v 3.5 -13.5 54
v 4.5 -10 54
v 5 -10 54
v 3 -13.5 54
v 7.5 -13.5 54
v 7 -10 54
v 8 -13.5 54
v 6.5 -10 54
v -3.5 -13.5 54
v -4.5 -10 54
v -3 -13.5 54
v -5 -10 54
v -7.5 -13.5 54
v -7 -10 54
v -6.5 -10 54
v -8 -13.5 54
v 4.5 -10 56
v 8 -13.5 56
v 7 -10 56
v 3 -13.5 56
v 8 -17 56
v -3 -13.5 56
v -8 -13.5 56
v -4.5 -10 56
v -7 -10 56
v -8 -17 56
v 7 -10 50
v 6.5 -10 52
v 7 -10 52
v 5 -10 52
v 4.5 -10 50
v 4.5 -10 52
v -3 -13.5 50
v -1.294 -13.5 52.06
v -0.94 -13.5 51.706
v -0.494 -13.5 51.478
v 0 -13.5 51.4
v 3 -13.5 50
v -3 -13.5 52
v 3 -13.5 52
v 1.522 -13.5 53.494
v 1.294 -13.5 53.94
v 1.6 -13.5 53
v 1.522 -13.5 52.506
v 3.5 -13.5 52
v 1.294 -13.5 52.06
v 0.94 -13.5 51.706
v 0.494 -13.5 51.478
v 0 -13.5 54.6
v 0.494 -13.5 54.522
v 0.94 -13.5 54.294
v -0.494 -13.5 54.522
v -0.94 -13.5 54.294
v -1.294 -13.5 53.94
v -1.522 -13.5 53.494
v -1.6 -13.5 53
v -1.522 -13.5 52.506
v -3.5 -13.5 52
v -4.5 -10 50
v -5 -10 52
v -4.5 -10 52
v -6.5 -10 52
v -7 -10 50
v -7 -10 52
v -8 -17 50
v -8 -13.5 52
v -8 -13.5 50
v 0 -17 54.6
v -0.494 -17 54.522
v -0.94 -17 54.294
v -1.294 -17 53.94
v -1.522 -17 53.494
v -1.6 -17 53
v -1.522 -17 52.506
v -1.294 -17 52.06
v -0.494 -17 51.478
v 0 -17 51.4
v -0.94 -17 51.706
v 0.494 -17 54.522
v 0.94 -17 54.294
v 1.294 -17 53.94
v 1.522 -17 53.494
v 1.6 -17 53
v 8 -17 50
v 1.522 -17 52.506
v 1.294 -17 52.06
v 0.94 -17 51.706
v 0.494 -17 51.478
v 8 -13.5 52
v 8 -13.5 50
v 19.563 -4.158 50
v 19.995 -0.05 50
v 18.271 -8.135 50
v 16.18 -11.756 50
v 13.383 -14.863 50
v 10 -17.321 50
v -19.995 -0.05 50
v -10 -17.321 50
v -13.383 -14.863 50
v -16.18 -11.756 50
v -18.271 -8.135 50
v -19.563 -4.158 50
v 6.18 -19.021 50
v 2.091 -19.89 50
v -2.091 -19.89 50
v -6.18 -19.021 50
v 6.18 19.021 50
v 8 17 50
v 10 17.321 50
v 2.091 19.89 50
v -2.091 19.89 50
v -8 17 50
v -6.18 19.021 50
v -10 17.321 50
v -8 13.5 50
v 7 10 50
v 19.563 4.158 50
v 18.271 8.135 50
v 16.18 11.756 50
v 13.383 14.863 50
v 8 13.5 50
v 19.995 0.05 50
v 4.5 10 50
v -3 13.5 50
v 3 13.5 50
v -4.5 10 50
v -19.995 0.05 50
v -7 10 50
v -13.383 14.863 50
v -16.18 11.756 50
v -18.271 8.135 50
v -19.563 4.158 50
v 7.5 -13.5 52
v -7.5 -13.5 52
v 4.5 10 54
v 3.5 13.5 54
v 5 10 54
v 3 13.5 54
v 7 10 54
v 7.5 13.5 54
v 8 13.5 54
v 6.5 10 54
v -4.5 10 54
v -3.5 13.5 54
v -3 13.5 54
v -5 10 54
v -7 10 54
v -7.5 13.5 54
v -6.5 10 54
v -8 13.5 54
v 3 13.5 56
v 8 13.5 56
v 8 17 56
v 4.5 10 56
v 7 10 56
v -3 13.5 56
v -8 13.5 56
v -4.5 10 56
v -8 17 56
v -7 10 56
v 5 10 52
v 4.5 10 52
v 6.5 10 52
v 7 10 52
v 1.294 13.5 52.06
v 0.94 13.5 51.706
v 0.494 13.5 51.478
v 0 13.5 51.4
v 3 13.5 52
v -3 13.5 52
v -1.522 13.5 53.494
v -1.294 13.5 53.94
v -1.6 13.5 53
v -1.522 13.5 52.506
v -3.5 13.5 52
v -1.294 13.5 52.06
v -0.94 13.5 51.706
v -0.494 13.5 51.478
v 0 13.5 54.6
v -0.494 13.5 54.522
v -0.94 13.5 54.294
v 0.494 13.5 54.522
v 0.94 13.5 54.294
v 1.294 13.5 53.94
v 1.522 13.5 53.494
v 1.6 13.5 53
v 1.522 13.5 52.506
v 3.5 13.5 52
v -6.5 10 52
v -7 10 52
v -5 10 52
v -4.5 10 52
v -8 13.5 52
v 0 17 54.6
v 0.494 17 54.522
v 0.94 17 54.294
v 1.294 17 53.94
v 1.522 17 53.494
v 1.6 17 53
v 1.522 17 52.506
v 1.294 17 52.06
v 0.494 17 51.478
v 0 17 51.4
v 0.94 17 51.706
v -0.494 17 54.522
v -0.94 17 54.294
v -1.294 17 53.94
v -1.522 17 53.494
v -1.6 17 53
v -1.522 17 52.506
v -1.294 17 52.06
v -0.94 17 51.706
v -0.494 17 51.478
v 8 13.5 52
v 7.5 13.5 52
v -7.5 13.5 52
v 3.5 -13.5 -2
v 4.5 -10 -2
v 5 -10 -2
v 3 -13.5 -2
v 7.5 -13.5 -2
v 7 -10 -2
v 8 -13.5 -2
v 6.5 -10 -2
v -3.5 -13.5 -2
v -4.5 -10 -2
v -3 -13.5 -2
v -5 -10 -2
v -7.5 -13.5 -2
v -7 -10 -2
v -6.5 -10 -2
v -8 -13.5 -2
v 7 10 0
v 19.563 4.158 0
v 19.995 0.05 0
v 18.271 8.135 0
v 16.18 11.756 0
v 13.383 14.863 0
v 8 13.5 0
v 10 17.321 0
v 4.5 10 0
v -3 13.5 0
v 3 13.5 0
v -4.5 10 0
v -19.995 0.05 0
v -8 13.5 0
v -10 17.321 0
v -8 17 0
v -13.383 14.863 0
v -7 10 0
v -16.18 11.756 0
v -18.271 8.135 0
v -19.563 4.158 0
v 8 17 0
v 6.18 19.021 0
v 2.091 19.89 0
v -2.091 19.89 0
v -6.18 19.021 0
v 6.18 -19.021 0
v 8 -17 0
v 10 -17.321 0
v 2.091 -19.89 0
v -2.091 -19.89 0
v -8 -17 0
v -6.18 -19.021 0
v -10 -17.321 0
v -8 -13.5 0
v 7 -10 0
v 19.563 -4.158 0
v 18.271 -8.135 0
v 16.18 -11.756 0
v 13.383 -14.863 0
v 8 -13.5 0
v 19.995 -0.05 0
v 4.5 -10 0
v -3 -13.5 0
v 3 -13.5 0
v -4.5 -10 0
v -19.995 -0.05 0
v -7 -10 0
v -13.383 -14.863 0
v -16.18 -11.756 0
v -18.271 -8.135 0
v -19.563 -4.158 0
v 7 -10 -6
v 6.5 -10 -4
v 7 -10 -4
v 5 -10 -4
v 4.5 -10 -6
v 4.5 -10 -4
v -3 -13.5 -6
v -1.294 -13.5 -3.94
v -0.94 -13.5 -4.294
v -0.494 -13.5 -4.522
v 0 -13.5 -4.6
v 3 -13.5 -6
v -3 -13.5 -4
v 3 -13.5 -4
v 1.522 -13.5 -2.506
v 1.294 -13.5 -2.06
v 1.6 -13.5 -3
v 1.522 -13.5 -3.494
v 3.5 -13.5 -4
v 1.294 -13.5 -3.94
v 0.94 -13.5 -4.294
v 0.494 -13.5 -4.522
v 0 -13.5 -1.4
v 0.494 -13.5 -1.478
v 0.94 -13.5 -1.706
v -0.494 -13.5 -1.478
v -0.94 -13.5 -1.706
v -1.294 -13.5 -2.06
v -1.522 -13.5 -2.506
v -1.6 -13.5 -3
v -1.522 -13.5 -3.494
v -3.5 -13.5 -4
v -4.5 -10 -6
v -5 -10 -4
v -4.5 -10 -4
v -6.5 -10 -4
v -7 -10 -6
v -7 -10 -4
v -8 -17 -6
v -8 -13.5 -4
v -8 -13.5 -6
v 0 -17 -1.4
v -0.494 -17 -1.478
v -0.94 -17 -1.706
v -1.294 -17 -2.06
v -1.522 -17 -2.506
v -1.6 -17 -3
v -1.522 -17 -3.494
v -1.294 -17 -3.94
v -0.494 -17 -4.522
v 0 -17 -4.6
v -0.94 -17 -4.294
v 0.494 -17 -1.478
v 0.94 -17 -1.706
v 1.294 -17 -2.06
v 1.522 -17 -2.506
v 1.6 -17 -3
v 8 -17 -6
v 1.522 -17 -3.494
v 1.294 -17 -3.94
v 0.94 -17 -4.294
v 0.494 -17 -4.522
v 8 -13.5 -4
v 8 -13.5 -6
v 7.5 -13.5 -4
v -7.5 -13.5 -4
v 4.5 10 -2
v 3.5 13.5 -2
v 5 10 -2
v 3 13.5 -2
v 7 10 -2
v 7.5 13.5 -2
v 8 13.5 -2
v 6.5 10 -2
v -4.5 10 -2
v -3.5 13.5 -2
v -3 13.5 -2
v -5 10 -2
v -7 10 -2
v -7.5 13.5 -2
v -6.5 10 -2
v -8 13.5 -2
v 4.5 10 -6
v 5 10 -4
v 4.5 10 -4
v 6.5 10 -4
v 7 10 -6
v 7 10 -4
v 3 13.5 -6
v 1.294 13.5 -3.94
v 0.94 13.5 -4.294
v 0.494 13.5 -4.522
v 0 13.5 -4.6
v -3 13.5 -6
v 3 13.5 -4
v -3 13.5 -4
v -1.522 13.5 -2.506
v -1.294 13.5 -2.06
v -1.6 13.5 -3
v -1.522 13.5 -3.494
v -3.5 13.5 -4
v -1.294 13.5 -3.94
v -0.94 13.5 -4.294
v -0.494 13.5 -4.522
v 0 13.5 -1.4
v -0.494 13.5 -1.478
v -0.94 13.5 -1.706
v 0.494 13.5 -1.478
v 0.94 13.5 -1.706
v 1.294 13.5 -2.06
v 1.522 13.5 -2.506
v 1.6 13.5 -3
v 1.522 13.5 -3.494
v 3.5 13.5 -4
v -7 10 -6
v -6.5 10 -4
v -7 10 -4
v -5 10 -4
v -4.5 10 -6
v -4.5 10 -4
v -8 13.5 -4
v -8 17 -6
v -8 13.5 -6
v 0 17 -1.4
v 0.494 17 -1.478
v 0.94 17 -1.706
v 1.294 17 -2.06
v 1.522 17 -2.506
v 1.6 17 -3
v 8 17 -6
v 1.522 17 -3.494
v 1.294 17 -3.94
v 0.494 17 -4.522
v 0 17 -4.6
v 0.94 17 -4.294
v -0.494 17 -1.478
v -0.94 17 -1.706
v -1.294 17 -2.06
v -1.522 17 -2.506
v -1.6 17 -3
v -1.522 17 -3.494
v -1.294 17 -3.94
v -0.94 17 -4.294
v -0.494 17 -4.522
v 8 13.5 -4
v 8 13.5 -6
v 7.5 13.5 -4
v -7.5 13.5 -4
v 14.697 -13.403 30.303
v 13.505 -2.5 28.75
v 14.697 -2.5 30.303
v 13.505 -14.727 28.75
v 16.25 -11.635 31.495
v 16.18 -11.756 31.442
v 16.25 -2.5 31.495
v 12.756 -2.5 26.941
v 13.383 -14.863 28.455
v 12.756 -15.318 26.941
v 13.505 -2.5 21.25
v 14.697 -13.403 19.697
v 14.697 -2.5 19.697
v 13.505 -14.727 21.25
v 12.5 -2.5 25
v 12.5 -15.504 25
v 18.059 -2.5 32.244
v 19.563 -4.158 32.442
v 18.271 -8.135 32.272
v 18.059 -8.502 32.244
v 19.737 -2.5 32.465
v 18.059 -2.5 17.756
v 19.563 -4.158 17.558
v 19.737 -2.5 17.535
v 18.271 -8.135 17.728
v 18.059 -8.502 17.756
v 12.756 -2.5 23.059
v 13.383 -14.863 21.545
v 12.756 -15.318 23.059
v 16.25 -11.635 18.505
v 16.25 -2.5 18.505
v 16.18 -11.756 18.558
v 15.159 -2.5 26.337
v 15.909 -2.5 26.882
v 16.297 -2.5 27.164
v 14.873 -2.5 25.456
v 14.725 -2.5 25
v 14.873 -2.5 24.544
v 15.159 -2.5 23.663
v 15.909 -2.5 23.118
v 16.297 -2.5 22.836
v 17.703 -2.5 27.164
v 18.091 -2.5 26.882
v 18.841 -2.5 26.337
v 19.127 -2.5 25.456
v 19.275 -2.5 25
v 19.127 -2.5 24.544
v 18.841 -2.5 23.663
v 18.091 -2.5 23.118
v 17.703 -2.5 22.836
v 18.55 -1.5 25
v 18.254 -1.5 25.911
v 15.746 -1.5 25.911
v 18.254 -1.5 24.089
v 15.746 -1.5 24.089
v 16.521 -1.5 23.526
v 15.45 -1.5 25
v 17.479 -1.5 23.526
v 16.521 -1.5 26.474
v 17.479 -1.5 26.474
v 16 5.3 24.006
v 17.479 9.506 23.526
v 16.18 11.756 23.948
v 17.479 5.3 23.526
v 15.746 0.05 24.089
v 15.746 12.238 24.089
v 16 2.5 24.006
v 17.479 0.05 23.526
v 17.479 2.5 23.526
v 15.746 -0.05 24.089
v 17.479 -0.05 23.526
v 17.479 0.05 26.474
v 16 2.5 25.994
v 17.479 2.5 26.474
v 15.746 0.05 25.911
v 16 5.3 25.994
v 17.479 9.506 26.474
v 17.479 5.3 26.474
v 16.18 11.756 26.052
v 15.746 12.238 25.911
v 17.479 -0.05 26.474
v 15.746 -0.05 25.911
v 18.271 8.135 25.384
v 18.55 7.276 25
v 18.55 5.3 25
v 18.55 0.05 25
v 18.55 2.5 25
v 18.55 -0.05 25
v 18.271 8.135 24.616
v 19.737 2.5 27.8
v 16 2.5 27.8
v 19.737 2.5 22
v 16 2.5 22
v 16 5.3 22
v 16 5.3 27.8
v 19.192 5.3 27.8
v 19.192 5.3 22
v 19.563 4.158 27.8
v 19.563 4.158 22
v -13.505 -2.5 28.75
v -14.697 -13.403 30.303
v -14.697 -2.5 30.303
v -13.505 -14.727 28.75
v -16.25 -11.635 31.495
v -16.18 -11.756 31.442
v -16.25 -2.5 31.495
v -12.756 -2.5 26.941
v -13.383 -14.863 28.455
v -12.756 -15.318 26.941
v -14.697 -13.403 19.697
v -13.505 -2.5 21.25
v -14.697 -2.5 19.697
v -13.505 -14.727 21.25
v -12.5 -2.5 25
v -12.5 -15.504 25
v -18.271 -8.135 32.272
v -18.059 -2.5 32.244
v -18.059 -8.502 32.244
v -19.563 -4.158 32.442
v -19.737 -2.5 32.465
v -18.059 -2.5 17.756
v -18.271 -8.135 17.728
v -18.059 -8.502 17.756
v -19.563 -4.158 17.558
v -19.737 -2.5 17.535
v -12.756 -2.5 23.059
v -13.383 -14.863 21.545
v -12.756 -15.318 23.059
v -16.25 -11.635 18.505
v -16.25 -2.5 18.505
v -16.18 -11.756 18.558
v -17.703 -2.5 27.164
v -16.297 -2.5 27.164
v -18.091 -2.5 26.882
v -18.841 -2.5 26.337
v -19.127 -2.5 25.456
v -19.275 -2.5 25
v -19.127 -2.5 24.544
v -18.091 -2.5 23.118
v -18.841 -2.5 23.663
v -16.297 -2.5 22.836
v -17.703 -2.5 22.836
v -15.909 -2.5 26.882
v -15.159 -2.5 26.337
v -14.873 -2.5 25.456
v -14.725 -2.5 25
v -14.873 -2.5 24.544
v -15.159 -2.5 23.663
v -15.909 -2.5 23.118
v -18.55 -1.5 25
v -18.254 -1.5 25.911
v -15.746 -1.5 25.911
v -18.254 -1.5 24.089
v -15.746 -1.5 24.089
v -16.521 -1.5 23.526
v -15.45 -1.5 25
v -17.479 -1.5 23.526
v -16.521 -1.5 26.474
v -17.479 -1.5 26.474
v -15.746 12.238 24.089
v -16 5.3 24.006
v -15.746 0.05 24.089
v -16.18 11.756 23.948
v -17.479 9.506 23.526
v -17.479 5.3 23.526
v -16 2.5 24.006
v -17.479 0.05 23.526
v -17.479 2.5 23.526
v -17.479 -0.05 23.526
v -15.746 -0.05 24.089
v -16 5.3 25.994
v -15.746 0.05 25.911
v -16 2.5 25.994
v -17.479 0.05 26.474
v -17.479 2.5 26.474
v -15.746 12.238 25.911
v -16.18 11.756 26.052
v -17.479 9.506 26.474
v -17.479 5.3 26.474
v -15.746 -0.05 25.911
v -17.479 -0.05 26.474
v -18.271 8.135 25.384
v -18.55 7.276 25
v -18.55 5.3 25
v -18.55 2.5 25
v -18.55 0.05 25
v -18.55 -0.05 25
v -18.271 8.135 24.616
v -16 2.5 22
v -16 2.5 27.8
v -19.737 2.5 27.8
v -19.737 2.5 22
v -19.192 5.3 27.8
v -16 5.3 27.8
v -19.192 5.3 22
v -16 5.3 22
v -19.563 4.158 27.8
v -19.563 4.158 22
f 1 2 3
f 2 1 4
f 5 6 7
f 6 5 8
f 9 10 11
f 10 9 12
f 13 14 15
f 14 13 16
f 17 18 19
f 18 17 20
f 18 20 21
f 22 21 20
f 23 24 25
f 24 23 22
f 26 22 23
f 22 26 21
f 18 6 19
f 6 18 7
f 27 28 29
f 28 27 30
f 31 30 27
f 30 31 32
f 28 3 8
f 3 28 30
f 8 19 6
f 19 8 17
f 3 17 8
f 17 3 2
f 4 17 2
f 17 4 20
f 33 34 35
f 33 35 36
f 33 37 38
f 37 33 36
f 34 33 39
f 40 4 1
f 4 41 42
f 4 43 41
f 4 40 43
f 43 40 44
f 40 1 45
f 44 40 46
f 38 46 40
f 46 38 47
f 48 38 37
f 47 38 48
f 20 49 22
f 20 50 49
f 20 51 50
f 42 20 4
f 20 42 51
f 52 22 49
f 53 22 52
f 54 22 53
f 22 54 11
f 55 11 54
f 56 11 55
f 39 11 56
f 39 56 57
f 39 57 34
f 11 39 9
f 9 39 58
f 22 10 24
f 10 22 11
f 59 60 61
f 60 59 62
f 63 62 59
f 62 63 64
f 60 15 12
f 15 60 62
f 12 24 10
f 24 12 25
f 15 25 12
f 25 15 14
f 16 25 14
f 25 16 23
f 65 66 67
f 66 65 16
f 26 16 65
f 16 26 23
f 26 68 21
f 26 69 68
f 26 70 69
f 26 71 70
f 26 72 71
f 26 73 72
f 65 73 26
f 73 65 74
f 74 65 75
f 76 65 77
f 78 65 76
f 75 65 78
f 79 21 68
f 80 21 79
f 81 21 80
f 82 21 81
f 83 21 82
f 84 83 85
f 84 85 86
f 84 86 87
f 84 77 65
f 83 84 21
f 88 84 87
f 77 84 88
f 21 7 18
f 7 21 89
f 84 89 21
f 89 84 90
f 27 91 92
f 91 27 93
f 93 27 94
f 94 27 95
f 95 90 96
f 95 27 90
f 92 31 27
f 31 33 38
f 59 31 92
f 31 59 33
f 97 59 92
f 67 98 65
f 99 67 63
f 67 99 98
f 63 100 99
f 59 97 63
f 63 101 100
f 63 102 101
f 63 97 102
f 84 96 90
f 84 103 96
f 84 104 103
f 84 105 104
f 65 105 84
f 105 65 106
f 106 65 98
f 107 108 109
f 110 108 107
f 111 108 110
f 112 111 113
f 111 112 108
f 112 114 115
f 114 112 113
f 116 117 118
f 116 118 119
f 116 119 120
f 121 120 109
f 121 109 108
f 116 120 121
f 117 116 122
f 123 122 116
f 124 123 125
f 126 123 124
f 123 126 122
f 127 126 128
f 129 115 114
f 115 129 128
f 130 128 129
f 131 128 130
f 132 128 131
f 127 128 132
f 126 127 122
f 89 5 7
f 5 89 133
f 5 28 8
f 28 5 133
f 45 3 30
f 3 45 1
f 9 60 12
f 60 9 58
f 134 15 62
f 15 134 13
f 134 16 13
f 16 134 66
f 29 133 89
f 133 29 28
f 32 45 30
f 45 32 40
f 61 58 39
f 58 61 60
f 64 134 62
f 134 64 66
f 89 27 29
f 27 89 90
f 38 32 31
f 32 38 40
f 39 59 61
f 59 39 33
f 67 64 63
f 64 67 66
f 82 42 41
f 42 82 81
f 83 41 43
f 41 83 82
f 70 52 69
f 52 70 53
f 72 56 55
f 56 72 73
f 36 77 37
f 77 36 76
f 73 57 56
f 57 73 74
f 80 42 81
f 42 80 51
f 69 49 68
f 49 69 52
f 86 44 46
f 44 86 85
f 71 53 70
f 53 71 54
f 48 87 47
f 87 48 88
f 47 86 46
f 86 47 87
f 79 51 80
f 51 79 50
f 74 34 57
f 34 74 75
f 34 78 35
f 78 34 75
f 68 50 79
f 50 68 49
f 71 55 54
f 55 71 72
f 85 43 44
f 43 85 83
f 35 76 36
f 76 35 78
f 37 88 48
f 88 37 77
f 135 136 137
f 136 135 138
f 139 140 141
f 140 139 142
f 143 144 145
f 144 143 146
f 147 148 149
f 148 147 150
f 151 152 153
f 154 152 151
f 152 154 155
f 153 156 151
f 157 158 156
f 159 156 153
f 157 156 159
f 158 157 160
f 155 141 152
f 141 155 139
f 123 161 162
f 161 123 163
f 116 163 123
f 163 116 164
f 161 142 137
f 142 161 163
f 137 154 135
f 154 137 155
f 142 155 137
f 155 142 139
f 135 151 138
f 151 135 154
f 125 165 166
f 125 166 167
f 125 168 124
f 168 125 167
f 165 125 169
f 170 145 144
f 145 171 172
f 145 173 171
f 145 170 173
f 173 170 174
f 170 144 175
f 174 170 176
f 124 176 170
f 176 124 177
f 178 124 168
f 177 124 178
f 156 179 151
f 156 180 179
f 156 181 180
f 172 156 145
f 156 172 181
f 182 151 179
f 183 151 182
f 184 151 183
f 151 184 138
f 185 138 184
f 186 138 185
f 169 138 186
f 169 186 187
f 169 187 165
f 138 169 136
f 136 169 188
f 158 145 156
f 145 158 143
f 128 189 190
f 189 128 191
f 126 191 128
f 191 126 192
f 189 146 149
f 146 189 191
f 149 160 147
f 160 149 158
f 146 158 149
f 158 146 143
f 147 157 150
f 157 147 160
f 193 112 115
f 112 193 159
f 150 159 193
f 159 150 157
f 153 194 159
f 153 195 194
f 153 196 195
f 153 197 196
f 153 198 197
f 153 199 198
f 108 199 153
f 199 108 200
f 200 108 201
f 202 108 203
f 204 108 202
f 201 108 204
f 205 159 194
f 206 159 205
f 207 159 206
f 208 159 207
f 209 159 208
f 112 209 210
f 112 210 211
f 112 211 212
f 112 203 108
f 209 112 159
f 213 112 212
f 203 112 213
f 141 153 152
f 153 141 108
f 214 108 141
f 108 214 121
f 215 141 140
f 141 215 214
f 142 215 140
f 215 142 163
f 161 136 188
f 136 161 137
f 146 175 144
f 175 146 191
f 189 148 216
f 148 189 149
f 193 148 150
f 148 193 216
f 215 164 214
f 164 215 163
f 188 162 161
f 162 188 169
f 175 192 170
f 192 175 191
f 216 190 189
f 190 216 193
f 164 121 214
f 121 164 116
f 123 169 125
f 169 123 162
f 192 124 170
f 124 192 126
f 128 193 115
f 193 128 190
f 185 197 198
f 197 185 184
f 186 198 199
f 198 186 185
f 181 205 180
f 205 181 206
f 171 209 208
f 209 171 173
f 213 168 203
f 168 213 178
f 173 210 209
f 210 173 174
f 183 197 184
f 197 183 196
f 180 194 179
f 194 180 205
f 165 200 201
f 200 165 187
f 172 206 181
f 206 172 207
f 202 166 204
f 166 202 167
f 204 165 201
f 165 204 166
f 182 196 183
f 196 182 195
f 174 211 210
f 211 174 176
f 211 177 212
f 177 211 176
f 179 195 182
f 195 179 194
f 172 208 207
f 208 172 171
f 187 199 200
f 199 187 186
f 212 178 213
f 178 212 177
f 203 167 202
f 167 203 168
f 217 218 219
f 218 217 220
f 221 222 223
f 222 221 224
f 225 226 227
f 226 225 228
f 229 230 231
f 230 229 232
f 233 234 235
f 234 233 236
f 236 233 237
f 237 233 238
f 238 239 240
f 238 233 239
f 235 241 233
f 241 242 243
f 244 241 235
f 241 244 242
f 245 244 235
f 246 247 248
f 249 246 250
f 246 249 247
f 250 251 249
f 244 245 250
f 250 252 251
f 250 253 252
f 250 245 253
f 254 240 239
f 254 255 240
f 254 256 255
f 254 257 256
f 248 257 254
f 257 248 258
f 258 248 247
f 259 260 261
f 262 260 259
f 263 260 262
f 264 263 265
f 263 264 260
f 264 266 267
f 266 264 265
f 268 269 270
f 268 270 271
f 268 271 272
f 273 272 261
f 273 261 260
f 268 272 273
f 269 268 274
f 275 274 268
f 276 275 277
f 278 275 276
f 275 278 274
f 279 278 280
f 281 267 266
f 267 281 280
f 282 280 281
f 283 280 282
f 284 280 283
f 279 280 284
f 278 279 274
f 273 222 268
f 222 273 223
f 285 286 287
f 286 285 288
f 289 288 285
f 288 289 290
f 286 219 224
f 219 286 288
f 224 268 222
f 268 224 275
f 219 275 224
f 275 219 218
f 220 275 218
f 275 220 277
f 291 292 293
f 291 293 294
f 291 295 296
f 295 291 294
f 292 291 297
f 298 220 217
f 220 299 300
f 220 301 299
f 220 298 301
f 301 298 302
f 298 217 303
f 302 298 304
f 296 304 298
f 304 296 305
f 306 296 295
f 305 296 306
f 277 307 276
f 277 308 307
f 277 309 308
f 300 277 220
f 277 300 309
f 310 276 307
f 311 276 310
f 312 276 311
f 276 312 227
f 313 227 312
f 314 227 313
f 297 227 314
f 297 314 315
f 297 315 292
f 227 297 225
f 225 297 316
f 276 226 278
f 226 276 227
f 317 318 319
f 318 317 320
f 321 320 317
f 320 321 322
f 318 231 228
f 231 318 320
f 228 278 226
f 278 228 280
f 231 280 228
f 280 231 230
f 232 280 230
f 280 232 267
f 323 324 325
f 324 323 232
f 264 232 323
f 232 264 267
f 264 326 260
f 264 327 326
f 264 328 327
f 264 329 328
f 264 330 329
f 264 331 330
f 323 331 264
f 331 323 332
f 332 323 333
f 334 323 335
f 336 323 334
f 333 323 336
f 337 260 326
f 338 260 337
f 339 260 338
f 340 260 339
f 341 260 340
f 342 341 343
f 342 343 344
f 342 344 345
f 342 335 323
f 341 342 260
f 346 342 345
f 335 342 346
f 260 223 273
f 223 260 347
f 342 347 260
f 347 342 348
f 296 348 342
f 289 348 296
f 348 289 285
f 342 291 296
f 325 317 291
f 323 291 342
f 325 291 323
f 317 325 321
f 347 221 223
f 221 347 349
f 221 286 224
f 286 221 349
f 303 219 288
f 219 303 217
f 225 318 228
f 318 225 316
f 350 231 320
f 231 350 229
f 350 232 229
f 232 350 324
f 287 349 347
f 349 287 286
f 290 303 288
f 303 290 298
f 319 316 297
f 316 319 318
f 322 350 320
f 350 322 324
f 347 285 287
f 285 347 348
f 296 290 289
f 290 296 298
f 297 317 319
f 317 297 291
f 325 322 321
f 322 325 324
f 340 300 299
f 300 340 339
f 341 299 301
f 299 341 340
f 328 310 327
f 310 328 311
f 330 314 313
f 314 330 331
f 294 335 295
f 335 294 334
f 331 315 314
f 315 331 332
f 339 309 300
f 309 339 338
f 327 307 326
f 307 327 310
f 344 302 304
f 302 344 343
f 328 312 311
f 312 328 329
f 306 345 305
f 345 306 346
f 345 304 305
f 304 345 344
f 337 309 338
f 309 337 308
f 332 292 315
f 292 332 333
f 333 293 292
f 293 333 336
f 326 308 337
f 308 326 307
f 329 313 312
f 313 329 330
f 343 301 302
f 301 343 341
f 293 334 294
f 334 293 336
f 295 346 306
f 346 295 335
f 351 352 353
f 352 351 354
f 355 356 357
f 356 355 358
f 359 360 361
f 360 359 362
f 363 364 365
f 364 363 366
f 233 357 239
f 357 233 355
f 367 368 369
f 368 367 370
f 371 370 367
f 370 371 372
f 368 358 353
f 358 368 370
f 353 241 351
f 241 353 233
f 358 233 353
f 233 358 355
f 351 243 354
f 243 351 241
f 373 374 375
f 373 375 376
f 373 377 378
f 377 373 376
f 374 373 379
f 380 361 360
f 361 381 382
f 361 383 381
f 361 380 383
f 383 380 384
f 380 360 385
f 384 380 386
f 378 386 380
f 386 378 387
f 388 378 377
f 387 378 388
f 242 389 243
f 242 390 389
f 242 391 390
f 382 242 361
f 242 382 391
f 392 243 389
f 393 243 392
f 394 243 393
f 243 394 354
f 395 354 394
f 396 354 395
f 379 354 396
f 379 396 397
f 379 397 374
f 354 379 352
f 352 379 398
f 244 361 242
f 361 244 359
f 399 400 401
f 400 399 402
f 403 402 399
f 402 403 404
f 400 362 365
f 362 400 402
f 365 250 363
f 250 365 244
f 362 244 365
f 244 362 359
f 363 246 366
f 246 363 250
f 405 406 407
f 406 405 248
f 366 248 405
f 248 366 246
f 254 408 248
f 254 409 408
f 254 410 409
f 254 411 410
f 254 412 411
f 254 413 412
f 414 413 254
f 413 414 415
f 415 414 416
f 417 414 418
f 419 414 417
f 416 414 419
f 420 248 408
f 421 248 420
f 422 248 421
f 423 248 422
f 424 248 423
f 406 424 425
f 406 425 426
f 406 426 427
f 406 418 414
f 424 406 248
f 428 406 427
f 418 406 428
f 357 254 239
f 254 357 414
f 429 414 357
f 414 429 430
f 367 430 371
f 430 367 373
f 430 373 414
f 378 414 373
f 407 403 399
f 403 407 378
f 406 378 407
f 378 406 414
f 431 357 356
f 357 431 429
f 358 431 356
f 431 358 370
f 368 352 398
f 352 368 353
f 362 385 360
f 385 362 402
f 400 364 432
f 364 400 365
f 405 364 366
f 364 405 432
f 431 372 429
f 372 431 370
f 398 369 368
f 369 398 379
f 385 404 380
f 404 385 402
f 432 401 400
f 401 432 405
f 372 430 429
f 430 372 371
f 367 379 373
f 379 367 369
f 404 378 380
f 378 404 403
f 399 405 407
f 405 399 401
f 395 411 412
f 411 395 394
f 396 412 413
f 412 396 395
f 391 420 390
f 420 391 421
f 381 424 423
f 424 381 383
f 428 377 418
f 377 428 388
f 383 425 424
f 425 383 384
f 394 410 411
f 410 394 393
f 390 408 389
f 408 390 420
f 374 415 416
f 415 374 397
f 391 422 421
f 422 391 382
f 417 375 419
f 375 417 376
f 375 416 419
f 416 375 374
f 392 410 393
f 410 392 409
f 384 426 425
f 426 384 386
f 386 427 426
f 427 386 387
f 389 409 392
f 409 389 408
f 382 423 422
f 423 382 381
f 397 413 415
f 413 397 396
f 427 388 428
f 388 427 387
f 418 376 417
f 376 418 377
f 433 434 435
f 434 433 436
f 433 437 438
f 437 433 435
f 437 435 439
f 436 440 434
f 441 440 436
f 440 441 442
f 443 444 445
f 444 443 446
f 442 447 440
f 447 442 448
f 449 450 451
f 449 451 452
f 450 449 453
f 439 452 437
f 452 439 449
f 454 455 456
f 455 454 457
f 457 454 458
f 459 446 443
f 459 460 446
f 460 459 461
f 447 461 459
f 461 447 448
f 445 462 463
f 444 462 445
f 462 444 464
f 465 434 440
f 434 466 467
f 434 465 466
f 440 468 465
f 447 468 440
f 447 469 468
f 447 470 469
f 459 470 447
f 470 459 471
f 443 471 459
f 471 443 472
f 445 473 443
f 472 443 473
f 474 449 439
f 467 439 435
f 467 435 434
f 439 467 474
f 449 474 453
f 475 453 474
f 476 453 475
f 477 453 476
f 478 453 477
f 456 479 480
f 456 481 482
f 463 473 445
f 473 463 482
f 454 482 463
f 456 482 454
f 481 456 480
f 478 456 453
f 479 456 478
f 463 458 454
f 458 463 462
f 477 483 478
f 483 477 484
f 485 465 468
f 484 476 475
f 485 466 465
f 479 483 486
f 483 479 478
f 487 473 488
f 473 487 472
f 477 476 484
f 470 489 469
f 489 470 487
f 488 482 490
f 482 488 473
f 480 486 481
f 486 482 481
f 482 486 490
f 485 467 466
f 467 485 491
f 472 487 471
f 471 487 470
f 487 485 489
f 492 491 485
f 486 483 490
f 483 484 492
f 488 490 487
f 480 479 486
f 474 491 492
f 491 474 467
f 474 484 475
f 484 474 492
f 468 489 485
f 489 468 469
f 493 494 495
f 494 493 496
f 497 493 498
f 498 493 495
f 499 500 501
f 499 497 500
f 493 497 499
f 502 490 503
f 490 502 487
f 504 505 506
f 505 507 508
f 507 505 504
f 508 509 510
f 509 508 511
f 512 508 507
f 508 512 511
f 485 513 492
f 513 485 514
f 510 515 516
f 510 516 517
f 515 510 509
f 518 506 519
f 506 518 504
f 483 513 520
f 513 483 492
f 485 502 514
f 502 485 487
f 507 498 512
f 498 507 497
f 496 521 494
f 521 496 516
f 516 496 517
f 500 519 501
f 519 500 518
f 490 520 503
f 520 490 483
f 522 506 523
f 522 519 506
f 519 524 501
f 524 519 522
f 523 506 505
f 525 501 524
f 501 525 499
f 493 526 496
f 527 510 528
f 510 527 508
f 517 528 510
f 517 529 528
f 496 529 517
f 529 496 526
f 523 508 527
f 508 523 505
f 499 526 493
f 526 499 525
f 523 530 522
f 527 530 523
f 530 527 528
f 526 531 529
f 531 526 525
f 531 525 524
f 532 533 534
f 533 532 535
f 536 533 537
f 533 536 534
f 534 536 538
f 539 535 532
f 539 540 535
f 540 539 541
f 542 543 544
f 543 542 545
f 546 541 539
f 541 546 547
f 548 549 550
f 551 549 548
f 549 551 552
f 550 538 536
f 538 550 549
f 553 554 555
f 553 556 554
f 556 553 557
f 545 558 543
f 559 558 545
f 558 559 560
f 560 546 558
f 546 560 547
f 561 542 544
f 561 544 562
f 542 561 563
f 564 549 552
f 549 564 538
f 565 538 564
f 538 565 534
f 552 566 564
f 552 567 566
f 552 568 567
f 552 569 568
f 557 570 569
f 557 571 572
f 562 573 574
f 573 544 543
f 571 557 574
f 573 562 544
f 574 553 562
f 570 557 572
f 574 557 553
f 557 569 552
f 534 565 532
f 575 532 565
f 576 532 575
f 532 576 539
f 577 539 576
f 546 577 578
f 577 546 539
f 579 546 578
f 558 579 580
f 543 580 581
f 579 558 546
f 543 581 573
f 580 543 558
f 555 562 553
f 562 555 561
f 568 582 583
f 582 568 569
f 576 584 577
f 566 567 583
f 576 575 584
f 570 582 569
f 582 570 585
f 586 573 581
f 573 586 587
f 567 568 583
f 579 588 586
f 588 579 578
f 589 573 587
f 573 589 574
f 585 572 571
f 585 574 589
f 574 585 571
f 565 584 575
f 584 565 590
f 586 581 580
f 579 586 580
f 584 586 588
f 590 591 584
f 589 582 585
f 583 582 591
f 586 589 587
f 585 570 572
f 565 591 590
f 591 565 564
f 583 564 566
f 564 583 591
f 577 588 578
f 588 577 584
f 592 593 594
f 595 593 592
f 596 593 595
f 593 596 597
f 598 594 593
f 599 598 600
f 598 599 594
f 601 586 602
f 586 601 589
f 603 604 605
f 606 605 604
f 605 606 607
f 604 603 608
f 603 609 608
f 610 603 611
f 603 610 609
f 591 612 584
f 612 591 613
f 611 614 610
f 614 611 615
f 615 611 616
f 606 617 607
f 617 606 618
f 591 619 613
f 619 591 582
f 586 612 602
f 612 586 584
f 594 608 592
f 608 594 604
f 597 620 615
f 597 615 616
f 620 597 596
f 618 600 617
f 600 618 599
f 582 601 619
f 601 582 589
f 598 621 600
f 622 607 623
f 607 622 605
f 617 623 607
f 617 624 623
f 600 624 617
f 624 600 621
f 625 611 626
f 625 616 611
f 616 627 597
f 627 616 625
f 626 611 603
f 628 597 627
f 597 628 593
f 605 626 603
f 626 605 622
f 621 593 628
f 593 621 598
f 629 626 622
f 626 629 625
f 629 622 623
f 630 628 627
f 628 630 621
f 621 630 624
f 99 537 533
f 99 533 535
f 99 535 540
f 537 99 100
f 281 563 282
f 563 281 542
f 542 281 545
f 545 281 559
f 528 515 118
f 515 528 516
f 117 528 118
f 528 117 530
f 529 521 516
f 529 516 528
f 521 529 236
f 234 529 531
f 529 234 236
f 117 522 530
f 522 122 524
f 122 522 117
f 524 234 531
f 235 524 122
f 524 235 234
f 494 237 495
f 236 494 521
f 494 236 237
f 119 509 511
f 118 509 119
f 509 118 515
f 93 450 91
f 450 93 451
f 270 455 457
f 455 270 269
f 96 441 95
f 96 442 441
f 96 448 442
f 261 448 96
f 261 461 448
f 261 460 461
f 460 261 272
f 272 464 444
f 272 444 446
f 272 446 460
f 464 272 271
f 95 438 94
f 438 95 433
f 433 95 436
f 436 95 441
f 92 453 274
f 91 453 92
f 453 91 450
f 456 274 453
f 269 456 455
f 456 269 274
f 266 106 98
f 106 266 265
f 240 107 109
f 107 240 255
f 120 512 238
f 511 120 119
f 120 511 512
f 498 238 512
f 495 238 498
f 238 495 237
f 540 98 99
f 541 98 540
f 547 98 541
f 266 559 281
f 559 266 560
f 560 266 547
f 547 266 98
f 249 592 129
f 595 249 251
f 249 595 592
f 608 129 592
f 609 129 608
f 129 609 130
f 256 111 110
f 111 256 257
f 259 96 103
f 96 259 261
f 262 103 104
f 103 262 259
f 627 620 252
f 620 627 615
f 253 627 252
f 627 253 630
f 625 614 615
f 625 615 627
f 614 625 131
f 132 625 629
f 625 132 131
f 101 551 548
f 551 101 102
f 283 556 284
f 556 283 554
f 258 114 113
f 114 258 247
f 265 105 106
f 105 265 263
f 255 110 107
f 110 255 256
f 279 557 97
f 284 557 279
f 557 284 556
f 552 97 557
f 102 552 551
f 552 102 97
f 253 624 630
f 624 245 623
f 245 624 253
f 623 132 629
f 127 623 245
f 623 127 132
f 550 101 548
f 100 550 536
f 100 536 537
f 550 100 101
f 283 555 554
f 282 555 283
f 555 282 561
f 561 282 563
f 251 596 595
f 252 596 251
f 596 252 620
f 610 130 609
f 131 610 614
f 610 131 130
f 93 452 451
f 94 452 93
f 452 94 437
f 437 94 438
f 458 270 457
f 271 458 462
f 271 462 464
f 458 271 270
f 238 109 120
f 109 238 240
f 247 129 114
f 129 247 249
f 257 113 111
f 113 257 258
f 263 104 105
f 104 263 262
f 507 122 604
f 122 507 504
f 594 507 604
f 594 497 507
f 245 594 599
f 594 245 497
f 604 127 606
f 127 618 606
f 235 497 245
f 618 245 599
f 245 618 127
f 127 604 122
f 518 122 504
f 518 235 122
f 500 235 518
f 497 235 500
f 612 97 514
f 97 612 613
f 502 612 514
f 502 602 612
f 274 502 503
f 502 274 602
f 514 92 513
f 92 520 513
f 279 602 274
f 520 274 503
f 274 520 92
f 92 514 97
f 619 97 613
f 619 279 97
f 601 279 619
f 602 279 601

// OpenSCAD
// file: module_connector.scad
module module_connector(){
    for(i=[0:1])
    mirror([0,i,0])
    translate([0,-27/2,0])
    3d_mouth_with_hole();
}


module 3d_mouth_with_hole(){
    difference(){
        3d_mouth();
        #translate([0,0,3])
        rotate([90,0,0])
        cylinder(10, 3.2/2, 3.2/2, $fn=20);
    }
}


module 3d_mouth(){
    translate([-8,0,0]){
        translate([0,0,4])
        linear_extrude(2) mouth();
        linear_extrude(6) mouth(t=1.5, so=1, si=1.5, gap=7, og=0.5);
        linear_extrude(2) mouth();
    }
}


module mouth(t=2.5, so=1, si=1.5, gap=6, og=0){

teeth = so+t+si;

polygon([[0,0], [og,0], [og+so, 3.5], [og+so+t, 3.5], [og+so+t+si, 0], 
         [og+teeth+gap, 0], [og+teeth+gap+si, 3.5], [og+teeth+gap+si+t, 3.5], [og+teeth*2+gap, 0], [og+teeth*2+gap+og, 0],
         [og+teeth*2+gap+og, -3.5], [0, -3.5], 
         ]);
         
 }
// main file
include <module_connector.scad>

length = 50;


// Module connector
translate([0,0,length])
module_connector();

translate([0,0,-6])
module_connector();



difference(){
    cylinder(length, 40/2, 40/2);

    // Cut for assemble
    cube([length*2, 0.1, length*2], true);

    //Screw holes
    for(i=[0:1])
    mirror([i,0,0])
    translate([40/2,-2.5,length/2])
    rotate([90,0,0]){
        cylinder(length, d=15);
        translate([-3,0,-1])
        cylinder(2, d1=3.1, d2=6);

        #translate([-3,0,-25])
        cylinder(50, d=3.1);

        translate([-4,-3,-5-2.8])
        cube([10,5.8,2.8]);
    }
}
